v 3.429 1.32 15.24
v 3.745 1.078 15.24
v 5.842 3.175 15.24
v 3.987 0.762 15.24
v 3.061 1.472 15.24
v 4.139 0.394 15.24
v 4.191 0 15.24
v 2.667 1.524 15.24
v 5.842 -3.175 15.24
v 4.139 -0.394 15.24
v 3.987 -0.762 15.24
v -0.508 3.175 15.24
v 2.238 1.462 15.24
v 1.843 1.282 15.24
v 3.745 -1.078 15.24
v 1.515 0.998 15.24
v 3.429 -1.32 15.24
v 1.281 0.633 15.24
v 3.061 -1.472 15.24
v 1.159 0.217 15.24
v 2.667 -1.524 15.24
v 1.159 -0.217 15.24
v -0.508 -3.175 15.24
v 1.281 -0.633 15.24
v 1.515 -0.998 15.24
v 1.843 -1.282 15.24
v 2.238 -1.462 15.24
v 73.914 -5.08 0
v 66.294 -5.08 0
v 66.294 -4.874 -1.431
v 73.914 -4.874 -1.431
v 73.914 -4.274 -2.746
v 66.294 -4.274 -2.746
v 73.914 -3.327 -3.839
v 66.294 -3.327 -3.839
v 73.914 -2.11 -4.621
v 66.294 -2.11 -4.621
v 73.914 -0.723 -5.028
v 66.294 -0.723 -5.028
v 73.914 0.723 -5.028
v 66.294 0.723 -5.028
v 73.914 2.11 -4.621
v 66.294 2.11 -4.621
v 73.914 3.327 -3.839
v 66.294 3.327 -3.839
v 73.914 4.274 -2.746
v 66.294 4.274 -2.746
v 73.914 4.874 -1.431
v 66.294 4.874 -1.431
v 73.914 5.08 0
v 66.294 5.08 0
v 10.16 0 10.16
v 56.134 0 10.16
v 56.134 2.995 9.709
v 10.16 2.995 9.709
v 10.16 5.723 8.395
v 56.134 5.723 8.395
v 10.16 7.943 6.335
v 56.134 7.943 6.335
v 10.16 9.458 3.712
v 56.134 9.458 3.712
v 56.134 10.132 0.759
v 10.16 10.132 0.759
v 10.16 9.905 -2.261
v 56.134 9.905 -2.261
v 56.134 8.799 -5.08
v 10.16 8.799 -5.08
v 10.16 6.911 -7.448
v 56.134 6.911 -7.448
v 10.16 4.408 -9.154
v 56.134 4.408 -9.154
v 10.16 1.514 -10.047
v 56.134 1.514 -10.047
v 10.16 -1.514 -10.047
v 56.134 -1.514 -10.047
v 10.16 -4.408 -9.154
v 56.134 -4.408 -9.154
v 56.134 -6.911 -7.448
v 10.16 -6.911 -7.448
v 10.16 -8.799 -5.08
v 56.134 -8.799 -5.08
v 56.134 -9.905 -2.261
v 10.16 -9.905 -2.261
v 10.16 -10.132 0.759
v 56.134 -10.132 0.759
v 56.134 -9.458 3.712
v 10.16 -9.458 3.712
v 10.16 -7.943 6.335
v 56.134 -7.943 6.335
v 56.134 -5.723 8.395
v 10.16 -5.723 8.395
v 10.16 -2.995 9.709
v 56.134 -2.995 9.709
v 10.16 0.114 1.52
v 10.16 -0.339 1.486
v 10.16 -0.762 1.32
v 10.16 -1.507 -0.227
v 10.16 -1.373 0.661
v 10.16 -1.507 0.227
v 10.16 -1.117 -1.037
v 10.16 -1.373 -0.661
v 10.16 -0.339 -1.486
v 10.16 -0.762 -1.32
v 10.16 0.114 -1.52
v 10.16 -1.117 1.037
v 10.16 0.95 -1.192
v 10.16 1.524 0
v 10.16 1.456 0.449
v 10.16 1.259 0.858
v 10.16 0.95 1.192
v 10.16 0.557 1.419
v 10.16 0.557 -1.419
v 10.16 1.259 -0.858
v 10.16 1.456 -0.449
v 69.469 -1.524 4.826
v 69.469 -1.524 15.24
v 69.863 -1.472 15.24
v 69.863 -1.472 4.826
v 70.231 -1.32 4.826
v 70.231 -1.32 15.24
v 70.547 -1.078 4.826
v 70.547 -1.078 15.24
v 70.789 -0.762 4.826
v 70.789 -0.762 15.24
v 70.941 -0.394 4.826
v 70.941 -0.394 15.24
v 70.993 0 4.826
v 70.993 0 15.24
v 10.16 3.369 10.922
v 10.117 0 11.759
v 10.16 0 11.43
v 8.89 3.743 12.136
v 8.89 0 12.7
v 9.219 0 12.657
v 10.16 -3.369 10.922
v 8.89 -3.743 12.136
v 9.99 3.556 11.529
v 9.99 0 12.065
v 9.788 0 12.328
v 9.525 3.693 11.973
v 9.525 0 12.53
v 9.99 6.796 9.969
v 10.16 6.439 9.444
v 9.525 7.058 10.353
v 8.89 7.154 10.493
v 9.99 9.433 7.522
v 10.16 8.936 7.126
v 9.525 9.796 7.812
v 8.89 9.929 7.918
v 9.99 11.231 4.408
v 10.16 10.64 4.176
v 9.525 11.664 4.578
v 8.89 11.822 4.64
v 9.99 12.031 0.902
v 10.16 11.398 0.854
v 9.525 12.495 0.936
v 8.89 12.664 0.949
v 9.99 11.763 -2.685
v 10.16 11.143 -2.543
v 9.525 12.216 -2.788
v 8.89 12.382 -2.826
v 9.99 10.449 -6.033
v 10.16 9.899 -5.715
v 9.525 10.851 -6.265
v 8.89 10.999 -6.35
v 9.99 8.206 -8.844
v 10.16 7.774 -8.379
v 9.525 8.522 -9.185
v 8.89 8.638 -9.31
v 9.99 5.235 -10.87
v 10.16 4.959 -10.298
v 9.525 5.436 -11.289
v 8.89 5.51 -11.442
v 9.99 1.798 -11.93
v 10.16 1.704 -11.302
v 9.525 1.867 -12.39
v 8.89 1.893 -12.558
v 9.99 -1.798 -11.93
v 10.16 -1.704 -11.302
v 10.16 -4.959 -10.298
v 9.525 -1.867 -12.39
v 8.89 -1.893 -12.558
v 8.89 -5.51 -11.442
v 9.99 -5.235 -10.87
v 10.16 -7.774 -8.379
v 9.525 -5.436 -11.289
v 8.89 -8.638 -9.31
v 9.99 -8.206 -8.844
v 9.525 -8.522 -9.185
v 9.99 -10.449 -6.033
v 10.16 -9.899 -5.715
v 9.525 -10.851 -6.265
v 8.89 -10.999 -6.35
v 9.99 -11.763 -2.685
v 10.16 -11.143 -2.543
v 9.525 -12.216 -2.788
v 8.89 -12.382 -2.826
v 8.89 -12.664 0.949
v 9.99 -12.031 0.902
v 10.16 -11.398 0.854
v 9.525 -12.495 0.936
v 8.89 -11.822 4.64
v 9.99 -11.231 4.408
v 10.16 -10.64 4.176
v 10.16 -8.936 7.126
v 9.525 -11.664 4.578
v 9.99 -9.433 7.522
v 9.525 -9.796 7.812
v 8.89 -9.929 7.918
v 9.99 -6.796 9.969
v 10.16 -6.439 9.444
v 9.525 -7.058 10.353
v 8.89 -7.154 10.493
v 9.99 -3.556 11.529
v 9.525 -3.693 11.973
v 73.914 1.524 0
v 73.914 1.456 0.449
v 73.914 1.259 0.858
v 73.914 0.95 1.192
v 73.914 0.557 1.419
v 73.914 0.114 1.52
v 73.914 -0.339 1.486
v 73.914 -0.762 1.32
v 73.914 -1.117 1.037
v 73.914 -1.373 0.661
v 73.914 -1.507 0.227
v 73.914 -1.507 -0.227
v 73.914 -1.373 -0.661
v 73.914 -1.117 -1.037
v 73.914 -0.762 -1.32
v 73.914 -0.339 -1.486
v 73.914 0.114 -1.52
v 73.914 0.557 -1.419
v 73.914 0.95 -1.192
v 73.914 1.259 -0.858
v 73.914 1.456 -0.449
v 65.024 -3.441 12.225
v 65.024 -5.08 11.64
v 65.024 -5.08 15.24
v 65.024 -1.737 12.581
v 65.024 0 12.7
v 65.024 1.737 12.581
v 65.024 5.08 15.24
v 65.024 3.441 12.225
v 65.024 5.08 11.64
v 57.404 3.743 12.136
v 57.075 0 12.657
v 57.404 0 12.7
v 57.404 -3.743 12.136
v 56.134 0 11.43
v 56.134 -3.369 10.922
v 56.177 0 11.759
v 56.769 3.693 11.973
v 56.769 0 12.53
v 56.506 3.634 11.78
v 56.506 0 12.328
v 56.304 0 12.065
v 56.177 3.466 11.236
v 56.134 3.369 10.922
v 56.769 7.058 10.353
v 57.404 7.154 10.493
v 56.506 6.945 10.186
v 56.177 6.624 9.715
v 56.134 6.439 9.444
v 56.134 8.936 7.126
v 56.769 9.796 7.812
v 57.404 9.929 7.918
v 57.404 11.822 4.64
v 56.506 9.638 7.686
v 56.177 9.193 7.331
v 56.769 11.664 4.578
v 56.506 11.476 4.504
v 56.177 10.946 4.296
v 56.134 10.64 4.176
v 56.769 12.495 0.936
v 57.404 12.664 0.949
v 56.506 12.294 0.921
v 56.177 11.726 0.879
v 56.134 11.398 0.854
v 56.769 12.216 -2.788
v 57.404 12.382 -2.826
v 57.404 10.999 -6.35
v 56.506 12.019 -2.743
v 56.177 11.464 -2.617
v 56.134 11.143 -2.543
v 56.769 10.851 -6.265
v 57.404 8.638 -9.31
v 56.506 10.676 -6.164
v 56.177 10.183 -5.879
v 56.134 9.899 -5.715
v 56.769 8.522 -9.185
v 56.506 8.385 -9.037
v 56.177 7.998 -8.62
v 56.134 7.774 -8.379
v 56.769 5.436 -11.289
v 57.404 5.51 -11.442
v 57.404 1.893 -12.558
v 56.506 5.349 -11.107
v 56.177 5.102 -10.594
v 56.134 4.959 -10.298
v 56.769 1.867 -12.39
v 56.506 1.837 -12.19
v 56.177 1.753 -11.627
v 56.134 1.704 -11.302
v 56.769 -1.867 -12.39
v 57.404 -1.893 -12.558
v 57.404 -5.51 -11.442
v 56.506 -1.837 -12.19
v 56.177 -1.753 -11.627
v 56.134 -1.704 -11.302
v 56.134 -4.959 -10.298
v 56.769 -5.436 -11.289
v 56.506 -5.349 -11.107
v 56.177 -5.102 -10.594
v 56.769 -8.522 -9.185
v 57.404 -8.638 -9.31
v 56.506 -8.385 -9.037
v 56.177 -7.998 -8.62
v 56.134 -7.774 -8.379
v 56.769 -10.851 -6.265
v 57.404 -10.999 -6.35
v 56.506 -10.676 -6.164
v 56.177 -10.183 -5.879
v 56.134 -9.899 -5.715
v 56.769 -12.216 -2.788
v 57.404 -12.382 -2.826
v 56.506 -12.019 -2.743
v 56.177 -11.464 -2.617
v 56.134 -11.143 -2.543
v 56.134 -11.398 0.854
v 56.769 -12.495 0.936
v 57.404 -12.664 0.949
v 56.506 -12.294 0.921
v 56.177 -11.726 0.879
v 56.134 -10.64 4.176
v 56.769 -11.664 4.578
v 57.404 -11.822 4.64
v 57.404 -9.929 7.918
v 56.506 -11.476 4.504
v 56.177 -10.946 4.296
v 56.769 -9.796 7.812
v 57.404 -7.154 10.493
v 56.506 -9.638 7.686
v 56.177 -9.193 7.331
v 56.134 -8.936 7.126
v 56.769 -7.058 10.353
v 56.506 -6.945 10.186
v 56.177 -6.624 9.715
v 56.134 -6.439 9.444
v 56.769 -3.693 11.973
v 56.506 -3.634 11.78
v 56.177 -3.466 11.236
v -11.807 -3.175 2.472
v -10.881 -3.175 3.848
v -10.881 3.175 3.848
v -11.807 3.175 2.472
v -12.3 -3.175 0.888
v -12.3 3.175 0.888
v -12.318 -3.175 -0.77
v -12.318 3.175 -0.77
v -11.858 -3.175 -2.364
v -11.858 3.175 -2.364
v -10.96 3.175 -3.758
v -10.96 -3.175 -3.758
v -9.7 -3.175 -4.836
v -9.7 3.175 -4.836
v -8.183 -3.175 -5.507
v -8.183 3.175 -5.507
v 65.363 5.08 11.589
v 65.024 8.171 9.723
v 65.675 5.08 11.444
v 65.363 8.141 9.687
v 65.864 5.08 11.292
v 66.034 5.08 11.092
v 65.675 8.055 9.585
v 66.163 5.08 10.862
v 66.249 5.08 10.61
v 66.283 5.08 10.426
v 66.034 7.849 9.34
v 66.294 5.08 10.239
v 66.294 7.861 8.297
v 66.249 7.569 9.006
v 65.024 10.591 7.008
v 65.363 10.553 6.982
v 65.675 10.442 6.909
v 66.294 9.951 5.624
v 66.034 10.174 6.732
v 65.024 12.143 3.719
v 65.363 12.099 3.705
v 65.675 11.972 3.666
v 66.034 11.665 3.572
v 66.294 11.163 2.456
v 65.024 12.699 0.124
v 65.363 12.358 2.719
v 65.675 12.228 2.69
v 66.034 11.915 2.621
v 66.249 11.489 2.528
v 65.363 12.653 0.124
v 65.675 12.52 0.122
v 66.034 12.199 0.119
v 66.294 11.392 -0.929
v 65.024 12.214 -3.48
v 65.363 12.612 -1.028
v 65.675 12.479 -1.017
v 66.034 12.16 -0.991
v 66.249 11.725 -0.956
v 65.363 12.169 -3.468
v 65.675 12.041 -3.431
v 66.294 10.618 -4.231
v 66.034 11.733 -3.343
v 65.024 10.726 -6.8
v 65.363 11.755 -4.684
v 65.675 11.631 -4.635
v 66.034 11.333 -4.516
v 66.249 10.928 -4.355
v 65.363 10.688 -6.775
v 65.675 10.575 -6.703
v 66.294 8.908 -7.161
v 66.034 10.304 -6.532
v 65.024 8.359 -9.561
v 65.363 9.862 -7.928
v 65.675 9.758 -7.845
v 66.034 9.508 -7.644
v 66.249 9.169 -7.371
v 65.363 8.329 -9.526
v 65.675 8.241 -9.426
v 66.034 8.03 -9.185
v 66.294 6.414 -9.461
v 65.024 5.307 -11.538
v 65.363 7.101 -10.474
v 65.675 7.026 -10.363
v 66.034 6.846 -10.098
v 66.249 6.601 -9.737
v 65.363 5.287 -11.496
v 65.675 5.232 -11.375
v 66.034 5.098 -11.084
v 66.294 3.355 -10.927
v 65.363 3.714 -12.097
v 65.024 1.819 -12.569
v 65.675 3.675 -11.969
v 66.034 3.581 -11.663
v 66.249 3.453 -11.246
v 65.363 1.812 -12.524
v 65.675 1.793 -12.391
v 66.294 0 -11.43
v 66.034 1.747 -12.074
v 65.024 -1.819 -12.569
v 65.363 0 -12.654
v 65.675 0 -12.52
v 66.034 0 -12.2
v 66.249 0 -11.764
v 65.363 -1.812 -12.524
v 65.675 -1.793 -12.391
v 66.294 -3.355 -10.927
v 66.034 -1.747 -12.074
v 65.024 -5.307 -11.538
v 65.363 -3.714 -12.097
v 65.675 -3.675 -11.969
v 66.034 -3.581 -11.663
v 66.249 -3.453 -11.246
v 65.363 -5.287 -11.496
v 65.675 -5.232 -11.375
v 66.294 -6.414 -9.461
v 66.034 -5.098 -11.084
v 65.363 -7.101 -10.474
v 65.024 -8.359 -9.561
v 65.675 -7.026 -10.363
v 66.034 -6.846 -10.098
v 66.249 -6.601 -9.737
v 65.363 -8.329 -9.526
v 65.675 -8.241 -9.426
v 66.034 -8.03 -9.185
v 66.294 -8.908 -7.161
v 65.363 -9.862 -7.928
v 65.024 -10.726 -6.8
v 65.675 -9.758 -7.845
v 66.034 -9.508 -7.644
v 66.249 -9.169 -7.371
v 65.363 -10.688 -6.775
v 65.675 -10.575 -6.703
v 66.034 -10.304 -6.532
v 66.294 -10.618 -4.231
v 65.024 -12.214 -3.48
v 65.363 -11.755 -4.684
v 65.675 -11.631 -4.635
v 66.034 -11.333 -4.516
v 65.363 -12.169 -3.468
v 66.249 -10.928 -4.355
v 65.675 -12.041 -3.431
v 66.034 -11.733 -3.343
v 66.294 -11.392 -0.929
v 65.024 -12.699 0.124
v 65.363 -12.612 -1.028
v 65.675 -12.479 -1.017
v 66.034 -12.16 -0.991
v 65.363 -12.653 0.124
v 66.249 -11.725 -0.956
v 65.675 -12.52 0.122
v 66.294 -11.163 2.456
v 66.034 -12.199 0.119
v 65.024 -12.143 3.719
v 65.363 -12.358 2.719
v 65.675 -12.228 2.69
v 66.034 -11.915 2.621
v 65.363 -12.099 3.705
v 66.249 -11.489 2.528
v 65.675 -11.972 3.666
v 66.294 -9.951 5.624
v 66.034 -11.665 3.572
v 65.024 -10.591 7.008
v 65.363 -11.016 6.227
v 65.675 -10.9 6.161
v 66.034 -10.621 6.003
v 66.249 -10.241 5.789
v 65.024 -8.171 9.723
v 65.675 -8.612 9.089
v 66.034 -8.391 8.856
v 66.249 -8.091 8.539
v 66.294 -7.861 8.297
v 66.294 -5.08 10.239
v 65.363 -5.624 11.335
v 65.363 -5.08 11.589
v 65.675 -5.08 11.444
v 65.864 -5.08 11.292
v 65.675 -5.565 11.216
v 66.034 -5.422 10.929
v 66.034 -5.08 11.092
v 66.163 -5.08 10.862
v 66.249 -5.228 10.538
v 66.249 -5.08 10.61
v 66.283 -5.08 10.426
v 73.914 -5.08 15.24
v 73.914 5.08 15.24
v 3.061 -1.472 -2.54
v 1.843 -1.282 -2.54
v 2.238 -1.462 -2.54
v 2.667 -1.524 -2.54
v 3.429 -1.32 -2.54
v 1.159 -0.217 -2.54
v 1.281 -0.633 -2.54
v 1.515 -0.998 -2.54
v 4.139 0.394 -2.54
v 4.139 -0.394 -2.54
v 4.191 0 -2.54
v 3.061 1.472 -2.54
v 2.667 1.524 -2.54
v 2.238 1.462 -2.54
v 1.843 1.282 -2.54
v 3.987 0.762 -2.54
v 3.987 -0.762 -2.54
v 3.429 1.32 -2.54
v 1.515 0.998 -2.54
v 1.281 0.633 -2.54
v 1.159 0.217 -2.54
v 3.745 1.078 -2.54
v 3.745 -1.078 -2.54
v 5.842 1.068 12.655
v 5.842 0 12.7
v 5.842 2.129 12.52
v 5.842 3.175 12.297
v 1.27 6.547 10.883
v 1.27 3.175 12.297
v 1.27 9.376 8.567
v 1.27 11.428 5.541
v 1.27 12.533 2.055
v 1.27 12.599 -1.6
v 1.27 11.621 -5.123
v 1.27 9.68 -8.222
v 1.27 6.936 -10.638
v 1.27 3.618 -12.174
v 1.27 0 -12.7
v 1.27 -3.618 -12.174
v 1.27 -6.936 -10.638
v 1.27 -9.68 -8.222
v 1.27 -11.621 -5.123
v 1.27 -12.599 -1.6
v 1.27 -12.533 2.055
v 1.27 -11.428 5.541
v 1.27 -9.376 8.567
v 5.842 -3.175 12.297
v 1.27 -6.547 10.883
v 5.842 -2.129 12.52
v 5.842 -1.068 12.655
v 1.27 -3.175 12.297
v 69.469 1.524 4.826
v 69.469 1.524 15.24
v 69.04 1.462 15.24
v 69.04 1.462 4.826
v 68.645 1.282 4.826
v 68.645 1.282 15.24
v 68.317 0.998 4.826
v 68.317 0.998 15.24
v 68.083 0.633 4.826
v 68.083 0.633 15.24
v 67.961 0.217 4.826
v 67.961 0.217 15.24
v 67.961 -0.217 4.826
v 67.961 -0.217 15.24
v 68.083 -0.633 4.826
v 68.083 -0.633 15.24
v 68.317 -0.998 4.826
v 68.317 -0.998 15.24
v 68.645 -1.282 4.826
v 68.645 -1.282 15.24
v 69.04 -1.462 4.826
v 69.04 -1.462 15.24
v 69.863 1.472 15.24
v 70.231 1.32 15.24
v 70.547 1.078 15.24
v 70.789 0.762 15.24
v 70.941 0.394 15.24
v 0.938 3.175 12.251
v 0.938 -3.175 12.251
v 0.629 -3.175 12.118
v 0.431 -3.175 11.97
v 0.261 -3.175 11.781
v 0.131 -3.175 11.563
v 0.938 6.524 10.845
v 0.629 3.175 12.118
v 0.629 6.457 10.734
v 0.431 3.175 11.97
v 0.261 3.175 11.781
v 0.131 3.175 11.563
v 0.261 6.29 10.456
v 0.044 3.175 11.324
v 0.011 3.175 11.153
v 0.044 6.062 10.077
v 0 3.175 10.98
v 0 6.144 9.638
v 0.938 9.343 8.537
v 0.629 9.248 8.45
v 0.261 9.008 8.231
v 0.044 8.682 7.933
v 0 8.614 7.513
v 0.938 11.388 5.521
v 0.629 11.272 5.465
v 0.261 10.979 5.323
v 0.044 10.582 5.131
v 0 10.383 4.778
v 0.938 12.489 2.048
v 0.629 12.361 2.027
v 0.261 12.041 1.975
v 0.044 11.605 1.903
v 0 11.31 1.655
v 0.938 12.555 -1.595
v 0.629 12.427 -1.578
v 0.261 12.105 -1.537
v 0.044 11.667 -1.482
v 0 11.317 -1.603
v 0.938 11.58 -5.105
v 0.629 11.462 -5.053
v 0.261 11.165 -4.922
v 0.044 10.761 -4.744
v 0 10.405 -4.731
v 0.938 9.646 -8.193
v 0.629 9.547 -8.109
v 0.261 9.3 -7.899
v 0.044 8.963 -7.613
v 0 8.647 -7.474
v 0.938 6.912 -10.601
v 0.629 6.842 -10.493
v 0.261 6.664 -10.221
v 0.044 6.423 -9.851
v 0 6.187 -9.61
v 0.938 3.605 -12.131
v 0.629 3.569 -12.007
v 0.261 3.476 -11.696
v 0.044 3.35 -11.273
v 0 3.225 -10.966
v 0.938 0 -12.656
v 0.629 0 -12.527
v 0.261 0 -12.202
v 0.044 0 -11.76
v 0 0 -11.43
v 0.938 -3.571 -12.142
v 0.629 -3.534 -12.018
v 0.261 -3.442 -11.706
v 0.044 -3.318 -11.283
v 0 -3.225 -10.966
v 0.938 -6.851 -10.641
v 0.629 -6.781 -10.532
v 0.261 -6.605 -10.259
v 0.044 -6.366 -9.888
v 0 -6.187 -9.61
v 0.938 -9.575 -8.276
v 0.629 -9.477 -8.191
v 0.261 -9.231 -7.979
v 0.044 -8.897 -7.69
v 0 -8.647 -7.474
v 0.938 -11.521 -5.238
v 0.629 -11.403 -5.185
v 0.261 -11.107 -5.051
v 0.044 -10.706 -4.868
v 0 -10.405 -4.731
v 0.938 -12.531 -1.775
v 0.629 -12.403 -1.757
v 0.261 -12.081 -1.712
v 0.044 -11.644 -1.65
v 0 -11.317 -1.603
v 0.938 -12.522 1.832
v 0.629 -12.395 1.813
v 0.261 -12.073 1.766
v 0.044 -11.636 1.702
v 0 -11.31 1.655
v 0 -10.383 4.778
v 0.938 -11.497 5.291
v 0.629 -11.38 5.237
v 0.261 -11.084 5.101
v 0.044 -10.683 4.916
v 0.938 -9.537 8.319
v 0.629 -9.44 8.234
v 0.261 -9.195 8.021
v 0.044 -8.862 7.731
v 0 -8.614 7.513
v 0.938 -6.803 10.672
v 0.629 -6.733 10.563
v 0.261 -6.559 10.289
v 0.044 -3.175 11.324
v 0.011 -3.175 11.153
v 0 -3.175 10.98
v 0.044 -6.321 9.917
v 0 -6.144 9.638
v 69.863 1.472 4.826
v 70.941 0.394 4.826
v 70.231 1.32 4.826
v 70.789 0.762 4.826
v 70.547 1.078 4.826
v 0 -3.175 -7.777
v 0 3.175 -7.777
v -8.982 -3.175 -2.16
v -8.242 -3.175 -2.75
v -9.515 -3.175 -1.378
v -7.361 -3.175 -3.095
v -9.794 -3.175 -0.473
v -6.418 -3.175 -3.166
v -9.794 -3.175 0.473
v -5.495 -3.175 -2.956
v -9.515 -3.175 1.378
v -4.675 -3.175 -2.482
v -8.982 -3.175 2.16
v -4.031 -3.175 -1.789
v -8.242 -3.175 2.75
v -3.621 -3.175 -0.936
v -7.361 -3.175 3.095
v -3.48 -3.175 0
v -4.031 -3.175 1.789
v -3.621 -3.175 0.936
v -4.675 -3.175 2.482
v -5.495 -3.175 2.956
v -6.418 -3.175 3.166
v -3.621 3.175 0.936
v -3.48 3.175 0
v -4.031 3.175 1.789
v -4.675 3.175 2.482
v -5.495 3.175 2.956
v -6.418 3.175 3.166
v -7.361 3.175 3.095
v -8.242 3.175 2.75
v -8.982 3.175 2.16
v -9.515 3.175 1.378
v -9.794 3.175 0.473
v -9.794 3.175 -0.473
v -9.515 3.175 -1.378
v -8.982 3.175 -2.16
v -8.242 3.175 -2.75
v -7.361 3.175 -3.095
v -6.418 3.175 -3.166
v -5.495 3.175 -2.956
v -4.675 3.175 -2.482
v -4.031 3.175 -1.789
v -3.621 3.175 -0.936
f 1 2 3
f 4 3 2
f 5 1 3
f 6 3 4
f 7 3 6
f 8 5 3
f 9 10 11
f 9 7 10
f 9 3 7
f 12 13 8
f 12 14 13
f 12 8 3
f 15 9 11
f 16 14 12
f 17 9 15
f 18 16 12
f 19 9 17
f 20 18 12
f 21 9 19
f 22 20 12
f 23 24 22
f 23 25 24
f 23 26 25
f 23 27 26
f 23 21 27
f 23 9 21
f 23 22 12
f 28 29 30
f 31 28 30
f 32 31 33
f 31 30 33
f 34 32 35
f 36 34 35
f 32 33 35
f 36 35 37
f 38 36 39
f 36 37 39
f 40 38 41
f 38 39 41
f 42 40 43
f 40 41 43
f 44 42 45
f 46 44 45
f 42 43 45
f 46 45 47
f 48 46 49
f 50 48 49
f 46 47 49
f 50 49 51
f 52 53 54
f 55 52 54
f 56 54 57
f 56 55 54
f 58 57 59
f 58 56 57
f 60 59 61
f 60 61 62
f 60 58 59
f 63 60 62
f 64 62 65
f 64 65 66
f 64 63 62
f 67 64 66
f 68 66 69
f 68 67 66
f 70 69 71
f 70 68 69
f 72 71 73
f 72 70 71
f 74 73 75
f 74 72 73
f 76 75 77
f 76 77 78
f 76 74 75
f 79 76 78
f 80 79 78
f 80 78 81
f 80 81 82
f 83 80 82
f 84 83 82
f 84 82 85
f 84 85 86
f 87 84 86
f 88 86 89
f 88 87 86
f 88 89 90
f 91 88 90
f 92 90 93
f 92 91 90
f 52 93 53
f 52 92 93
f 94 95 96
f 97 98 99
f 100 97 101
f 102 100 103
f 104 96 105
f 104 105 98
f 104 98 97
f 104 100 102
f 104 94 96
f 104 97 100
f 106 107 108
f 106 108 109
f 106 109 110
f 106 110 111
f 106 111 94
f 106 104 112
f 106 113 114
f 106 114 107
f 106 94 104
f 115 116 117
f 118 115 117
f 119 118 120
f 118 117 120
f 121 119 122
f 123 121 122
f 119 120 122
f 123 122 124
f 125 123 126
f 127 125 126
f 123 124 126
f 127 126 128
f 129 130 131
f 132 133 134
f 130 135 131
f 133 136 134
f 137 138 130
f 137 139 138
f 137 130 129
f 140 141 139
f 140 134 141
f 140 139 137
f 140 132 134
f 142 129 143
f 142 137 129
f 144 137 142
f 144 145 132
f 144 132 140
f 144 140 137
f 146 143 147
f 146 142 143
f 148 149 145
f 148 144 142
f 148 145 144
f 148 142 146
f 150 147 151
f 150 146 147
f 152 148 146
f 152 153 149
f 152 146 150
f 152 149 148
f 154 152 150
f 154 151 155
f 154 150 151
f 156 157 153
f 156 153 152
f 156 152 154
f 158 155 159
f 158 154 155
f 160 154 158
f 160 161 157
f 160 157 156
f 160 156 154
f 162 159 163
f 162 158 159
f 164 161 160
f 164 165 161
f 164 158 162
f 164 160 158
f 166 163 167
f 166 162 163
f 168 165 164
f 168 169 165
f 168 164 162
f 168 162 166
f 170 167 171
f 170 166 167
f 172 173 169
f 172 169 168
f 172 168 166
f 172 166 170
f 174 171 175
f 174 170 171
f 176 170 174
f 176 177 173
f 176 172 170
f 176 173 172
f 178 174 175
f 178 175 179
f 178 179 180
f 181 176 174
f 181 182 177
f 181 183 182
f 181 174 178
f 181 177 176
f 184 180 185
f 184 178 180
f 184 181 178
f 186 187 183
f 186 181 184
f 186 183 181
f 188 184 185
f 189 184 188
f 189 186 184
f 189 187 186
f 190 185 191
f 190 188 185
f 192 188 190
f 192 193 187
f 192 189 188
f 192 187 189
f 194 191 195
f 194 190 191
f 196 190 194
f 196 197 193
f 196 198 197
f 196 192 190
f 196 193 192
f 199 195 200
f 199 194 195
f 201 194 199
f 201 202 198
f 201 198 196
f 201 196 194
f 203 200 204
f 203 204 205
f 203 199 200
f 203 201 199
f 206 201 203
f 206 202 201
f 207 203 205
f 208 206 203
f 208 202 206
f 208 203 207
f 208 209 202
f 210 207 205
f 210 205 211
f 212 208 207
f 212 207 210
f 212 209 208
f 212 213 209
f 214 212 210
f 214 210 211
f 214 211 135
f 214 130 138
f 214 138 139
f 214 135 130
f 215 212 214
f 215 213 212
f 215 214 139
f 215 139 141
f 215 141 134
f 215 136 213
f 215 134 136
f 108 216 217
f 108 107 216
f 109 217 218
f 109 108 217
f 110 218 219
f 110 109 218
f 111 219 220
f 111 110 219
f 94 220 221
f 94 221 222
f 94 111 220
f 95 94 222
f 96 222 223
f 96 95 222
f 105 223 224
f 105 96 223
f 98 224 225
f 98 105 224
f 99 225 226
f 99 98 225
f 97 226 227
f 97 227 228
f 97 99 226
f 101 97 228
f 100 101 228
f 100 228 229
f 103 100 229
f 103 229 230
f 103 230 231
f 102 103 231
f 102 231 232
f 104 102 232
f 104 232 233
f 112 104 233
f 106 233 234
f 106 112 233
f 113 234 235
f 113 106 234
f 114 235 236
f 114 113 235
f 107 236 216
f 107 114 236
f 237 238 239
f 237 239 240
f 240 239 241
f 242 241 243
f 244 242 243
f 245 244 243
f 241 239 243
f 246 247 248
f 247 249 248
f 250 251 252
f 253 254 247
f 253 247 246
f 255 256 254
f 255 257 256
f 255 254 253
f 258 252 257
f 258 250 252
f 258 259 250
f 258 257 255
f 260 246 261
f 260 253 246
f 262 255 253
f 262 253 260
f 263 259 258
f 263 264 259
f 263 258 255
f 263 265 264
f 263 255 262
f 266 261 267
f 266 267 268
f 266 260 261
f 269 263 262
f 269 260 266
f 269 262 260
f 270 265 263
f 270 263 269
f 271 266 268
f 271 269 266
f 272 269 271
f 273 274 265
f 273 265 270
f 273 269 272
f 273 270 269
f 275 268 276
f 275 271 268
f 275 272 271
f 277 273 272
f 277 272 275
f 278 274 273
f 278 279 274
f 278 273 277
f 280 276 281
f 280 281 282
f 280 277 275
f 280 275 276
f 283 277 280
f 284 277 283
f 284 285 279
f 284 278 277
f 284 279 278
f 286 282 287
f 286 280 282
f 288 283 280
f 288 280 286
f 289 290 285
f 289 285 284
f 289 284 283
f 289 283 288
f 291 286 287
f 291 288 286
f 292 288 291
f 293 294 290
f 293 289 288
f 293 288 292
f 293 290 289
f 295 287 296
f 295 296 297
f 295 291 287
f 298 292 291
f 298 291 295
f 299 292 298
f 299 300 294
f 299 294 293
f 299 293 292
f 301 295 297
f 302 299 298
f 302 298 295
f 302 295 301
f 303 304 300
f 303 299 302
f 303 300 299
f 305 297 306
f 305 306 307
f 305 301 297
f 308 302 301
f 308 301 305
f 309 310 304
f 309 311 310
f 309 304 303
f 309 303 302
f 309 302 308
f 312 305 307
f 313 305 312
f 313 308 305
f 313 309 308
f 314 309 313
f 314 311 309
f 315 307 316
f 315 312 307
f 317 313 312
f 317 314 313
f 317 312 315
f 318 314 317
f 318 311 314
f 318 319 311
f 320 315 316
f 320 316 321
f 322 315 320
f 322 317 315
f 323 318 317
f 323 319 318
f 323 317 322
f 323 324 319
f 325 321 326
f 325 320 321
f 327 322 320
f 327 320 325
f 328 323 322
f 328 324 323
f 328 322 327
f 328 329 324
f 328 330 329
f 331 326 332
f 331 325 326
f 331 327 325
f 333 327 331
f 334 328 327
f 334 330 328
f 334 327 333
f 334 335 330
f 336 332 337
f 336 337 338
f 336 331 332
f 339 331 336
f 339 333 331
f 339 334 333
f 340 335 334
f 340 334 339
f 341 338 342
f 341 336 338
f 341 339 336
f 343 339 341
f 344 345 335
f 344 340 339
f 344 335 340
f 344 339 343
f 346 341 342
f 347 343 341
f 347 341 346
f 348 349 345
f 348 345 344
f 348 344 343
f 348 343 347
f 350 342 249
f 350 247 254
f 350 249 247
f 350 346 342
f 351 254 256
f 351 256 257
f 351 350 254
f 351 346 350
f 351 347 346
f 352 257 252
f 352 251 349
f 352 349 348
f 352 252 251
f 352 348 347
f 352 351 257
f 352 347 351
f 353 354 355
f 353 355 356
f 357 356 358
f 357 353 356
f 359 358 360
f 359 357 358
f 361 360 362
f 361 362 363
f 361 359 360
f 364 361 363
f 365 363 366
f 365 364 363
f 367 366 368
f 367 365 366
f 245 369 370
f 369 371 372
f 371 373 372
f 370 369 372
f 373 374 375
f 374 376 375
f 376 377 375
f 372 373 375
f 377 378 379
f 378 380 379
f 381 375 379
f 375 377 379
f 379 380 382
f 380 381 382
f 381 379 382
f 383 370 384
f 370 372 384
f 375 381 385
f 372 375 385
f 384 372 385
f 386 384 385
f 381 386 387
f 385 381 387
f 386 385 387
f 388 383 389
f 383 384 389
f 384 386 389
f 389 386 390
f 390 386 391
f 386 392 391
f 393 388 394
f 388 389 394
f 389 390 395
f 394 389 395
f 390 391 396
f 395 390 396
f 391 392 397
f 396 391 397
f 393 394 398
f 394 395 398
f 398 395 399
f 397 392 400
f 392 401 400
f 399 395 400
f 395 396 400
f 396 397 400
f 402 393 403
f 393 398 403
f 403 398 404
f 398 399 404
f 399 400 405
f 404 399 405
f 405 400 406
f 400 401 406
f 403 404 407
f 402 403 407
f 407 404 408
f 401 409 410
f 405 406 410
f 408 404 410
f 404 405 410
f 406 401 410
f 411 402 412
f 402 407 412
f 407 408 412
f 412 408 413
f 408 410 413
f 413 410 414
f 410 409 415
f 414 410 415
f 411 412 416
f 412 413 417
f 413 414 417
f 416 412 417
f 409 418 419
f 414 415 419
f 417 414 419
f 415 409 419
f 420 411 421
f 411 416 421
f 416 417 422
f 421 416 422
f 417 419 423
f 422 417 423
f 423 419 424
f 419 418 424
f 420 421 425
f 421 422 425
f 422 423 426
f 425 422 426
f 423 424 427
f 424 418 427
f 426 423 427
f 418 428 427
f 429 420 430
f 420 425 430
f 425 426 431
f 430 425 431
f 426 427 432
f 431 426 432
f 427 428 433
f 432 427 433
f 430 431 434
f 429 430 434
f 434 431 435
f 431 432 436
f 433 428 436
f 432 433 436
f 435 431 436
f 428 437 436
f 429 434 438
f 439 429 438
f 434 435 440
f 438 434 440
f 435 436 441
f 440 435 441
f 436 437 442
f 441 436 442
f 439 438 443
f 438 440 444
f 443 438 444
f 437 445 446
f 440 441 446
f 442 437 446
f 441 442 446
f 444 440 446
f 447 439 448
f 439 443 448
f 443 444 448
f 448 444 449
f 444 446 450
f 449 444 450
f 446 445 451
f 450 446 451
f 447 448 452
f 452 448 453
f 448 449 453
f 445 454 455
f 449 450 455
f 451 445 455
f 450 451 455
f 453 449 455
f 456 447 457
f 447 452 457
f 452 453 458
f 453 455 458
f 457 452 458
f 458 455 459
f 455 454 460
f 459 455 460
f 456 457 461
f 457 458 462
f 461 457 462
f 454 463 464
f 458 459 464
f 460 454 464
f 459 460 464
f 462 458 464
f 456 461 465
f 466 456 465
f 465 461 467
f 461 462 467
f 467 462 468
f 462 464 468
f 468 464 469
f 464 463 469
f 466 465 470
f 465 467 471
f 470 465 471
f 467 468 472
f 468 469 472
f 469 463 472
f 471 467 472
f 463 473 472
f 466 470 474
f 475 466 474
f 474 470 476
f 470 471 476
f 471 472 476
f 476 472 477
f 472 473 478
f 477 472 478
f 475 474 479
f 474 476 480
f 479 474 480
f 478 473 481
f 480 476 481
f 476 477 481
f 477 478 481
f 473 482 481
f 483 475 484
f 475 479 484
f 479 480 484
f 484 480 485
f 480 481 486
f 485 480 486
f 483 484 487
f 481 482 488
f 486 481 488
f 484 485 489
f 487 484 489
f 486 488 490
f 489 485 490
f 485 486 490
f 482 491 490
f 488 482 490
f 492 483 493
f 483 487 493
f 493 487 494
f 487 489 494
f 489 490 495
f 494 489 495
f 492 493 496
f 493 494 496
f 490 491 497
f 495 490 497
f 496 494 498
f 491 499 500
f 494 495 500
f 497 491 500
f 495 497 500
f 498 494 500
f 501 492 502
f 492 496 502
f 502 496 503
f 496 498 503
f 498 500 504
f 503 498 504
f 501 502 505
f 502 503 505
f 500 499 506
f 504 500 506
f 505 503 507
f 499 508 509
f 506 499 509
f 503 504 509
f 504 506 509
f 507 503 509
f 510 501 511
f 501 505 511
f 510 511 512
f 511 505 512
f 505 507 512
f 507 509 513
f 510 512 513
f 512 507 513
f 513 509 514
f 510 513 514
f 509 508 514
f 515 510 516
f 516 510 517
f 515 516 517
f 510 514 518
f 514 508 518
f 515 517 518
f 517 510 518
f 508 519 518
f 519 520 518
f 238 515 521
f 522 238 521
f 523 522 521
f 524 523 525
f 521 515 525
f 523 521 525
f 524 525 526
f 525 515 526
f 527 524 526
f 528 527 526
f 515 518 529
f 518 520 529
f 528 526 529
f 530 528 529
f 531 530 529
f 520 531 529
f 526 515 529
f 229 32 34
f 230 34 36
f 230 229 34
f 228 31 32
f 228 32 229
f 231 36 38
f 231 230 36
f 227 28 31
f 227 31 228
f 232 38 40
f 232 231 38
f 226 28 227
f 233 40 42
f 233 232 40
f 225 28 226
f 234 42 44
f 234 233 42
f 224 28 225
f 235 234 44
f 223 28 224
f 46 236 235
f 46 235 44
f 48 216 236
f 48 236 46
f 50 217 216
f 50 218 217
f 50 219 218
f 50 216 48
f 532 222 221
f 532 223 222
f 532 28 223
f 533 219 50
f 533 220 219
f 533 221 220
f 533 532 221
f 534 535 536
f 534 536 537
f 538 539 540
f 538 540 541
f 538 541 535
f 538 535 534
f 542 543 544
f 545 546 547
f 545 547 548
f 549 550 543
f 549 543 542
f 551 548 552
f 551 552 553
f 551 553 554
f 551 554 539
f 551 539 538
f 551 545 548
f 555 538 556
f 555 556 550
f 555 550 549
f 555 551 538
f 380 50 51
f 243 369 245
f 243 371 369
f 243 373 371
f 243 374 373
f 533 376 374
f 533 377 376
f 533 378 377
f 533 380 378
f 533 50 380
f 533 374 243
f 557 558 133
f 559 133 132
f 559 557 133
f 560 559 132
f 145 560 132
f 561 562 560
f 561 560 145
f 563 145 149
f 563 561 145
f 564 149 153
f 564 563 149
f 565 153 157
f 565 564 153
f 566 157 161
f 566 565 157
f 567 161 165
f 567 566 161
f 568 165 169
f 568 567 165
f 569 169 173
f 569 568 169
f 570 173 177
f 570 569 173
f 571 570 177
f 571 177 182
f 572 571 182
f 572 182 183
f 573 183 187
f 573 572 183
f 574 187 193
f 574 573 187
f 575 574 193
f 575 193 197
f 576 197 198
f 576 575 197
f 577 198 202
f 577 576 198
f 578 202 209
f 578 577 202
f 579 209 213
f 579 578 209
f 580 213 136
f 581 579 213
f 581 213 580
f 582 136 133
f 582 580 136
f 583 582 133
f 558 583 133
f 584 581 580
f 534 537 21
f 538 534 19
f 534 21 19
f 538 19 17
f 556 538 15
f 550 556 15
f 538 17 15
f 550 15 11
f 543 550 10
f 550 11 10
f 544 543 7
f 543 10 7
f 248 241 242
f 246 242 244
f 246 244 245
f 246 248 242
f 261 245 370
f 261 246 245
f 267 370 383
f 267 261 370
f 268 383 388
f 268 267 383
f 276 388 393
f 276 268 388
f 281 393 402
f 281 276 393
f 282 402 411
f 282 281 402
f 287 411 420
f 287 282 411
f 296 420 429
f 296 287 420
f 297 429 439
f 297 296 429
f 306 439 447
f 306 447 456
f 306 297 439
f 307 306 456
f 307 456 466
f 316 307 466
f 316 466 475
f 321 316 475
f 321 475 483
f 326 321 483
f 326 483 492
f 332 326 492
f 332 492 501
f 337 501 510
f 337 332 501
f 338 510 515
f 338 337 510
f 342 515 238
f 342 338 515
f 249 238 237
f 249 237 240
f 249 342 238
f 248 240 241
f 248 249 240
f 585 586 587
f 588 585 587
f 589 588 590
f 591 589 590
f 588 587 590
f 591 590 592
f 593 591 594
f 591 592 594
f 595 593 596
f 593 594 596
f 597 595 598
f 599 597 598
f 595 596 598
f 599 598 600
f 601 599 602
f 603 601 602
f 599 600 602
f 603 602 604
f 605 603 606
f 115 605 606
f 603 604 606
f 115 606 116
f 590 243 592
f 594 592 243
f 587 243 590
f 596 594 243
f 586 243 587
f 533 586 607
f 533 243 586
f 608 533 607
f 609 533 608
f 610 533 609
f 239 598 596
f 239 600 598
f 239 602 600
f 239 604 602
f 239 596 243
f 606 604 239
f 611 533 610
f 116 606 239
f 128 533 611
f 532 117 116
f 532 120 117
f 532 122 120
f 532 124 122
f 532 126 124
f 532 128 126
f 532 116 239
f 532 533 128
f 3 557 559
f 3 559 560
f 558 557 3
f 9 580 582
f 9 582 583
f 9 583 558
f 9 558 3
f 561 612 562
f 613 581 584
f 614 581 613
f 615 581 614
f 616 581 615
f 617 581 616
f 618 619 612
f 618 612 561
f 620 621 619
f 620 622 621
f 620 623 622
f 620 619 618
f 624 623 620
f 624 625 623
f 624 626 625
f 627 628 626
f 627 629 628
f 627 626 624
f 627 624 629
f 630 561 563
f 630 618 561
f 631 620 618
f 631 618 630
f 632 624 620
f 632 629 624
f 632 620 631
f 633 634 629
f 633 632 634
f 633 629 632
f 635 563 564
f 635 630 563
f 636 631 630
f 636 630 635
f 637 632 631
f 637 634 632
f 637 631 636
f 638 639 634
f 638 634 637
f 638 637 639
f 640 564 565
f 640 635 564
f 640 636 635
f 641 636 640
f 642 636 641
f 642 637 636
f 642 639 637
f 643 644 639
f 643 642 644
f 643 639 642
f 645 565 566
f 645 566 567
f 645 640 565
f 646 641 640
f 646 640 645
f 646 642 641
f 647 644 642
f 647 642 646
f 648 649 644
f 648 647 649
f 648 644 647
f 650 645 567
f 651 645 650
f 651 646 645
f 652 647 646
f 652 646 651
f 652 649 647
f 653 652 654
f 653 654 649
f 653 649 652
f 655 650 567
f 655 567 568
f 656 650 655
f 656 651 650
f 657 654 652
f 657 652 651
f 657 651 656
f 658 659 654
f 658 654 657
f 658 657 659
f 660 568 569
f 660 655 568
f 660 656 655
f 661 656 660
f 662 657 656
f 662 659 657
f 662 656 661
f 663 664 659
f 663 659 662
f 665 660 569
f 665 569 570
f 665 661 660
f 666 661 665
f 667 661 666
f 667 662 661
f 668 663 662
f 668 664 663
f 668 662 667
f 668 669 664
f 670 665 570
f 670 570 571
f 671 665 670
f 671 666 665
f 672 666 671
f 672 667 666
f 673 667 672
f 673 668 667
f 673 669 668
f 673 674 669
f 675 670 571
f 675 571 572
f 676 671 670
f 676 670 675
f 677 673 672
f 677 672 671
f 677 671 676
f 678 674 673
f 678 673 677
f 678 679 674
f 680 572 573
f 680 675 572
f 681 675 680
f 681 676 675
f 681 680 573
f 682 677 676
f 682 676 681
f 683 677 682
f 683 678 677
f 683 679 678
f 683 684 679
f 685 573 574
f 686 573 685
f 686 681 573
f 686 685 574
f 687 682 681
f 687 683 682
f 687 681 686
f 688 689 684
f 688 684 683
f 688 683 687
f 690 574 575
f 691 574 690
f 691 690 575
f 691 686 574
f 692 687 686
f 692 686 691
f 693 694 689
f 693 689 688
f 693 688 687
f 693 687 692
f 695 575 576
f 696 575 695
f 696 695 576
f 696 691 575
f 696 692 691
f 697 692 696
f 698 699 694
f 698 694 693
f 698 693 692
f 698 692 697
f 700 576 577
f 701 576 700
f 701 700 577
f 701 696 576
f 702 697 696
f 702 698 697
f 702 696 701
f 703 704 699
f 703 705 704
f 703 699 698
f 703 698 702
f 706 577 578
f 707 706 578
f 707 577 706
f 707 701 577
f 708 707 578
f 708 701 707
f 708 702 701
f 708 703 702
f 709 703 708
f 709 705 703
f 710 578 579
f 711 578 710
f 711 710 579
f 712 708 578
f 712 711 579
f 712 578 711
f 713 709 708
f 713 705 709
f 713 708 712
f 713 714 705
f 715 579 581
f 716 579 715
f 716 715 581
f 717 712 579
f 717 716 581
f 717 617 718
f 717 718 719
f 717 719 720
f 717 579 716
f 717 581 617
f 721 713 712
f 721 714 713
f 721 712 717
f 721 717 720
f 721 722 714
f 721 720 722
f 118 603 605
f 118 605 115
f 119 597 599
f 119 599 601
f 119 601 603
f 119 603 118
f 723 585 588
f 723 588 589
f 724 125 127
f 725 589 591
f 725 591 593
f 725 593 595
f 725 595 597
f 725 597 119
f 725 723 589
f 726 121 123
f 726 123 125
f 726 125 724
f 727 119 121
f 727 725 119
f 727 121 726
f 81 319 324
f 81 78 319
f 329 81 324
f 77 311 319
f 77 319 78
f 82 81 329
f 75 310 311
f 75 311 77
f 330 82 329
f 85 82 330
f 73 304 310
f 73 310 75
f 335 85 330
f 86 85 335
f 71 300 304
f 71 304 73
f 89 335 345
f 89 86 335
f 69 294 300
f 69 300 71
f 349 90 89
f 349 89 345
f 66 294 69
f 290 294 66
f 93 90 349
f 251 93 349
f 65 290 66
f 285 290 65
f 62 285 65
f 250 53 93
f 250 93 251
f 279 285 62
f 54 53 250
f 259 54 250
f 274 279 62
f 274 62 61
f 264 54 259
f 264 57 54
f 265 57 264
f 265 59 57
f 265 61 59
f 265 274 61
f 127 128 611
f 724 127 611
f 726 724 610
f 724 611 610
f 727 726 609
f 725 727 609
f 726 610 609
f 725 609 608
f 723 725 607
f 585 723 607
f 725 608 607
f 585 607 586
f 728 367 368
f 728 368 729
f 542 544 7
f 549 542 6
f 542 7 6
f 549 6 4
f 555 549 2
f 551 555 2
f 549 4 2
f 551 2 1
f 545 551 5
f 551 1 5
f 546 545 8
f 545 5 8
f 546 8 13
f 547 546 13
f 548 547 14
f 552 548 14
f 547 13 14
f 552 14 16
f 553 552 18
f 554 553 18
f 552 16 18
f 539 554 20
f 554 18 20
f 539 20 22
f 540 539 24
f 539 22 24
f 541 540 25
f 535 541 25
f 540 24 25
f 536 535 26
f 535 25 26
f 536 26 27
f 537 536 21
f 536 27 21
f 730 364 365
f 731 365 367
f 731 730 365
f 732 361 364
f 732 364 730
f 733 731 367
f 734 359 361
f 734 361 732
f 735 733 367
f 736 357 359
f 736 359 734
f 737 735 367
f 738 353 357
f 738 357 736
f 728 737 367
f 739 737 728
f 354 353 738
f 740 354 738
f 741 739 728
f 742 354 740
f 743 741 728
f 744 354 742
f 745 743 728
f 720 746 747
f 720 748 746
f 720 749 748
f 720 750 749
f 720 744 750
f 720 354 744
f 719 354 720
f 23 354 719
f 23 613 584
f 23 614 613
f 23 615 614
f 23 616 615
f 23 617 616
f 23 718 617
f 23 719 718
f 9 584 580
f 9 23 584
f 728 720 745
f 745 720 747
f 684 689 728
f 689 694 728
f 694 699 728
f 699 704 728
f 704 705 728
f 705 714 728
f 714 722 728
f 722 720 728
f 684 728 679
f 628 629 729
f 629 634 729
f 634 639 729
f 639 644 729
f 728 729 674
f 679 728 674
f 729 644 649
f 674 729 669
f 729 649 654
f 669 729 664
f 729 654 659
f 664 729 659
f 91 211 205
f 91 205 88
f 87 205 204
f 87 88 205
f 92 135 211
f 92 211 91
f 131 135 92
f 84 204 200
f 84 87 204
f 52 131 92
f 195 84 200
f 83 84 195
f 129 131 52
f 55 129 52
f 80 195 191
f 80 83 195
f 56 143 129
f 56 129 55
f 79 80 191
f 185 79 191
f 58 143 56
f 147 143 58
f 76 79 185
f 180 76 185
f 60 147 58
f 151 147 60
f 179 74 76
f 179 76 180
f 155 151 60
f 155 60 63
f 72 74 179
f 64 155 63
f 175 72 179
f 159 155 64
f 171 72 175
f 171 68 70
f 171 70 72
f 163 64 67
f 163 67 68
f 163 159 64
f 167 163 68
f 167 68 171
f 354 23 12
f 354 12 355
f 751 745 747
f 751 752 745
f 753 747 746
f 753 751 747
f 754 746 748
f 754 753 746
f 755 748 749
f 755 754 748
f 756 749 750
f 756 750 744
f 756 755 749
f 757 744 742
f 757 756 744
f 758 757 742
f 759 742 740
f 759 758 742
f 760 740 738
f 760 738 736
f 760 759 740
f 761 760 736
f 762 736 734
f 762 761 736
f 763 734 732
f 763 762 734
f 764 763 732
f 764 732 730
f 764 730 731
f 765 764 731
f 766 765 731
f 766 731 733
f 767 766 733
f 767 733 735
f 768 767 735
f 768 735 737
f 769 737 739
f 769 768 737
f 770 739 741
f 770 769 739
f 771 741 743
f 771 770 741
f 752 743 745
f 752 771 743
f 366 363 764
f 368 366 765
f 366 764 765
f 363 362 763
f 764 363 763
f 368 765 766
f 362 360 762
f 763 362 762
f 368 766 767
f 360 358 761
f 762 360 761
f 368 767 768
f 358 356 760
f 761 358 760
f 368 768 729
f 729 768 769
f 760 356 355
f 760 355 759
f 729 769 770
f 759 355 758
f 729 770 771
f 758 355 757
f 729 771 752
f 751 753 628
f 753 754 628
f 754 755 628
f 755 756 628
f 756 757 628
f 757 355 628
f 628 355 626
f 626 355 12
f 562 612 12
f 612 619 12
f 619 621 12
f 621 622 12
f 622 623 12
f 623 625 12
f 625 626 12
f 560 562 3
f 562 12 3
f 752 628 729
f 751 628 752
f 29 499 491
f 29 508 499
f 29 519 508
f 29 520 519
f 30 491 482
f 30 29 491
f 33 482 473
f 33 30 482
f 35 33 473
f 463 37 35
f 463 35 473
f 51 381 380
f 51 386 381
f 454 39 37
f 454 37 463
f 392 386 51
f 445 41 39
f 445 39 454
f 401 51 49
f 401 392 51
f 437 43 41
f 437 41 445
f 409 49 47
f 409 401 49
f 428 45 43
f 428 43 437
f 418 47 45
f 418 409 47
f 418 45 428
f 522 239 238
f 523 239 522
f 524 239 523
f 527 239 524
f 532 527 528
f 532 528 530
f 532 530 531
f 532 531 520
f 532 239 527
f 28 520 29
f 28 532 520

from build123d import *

# Parameters (mm, degrees)
F0_W          = 5.842
F0_H          = 12.7
F0_R          = 3.175
F2_DEPTH      = 3.175
F3_R          = 1.524
F4_DEPTH      = 7.62
F4_DEPTH_BACK = 1.27
F5_DEPTH      = 56.134
F8_DEPTH      = 17.78
F9_DEPTH      = 10.414
F10_R         = 1.27


with BuildPart() as f1:
    # F0 (on Front) → F1 (revolve)
    with BuildSketch(Plane.XZ):
        Polygon((5.842, 12.7), (5.842, 0), (66.294, 0), (66.294, 12.7), (56.134, 12.7), (56.134, 10.16), (10.16, 10.16), (10.16, 12.7), align=None)
        with Locations((2.921, 6.35)):
            Rectangle(F0_W, F0_H)
    revolve(axis=Axis((33.147, 0, 0), (-1, 0, 0)))

    # F0 (on Front) → F2 (join, symmetric)
    with BuildSketch(Plane.XZ):
        with BuildLine():
            ThreePointArc((-8.1826630726, -5.5069827884), (-3.1957909266, -4.5493385486), (-0.9398, 0))
            ThreePointArc((-0.9398, 0), (-4.5919612295, 5.3297205562), (-10.8806298187, 3.8475430269))
            ThreePointArc((-10.8806298187, 3.8475430269), (-12.1459778134, -1.5837270034), (-8.1826630726, -5.5069827884))
        make_face()
        with Locations((-6.6548, 0)):
            Circle(F0_R, mode=Mode.SUBTRACT)
        with BuildLine():
            Line((-0.9398, 0), (0, 0))
            Line((0, 0), (0, 12.7))
            Line((0, 12.7), (5.842, 12.7))
            Line((5.842, 12.7), (5.842, 15.24))
            Line((5.842, 15.24), (-0.508, 15.24))
            Line((-0.508, 15.24), (-10.8806298187, 3.8475430269))
            ThreePointArc((-10.8806298187, 3.8475430269), (-4.5919612295, 5.3297205562), (-0.9398, 0))
        make_face()
        with Locations((2.921, 6.35)):
            Rectangle(F0_W, F0_H)
        with BuildLine():
            Line((5.842, 0), (0, 0))
            Line((0, 0), (-0.9398, 0))
            ThreePointArc((-0.9398, 0), (-3.1957909266, -4.5493385486), (-8.1826630726, -5.5069827884))
            Line((-8.1826630726, -5.5069827884), (5.842, -9.398))
            Line((5.842, -9.398), (5.842, 0))
        make_face()
    extrude(amount=F2_DEPTH, both=True)

    # F3 (on face) → F4 (join, two sides)
    with BuildSketch(Plane.YZ.offset(66.294)) as f4_sk:
        with BuildLine():
            ThreePointArc((-5.08, 11.6397422652), (0, 12.7), (5.08, 11.6397422652))
            Line((5.08, 11.6397422652), (5.08, 15.24))
            Line((5.08, 15.24), (-5.08, 15.24))
            Line((-5.08, 15.24), (-5.08, 11.6397422652))
        make_face()
        with BuildLine():
            ThreePointArc((-5.08, 0), (0, -5.08), (5.08, 0))
            ThreePointArc((5.08, 0), (0, 5.08), (-5.08, 0))
        make_face()
        Circle(F3_R, mode=Mode.SUBTRACT)
        with BuildLine():
            ThreePointArc((-5.08, 0), (0, 5.08), (5.08, 0))
            Line((5.08, 0), (5.08, 11.6397422652))
            ThreePointArc((5.08, 11.6397422652), (0, 12.7), (-5.08, 11.6397422652))
            Line((-5.08, 11.6397422652), (-5.08, 0))
        make_face()
    extrude(amount=F4_DEPTH)
    extrude(f4_sk.sketch, amount=-F4_DEPTH_BACK)

    # F5 (cut, through all): a face of the model
    f5_faces = [f1.faces().sort_by_distance(p)[0] for p in [
        (66.294, 0, 0),
    ]]
    extrude(f5_faces, amount=-F5_DEPTH, mode=Mode.SUBTRACT)

    # F6 (on face) → F8 (cut)
    with BuildSketch(Plane.XY.offset(15.24)):
        with BuildLine():
            ThreePointArc((2.667, -1.524), (3.7446307345, -1.0776307345), (4.191, 0))
            ThreePointArc((4.191, 0), (3.7446307345, 1.0776307345), (2.667, 1.524))
            ThreePointArc((2.667, 1.524), (1.143, 0), (2.667, -1.524))
        make_face()
    extrude(amount=-F8_DEPTH, mode=Mode.SUBTRACT)

    # F7 (on face) → F9 (cut)
    with BuildSketch(Plane.XY.offset(15.24)):
        with BuildLine():
            ThreePointArc((70.993, 0), (70.5466307345, 1.0776307345), (69.469, 1.524))
            ThreePointArc((69.469, 1.524), (67.945, 0), (69.469, -1.524))
            ThreePointArc((69.469, -1.524), (70.5466307345, -1.0776307345), (70.993, 0))
        make_face()
    extrude(amount=-F9_DEPTH, mode=Mode.SUBTRACT)

    # F10
    f10_edges = [f1.edges().sort_by_distance(p)[0] for p in [
        (56.134, 0, -12.7),
        (66.294, 0, -12.7),
        (10.16, 0, -12.7),
        (0, 0, -12.7),
    ]]
    fillet(f10_edges, radius=F10_R)


solid = f1.part
